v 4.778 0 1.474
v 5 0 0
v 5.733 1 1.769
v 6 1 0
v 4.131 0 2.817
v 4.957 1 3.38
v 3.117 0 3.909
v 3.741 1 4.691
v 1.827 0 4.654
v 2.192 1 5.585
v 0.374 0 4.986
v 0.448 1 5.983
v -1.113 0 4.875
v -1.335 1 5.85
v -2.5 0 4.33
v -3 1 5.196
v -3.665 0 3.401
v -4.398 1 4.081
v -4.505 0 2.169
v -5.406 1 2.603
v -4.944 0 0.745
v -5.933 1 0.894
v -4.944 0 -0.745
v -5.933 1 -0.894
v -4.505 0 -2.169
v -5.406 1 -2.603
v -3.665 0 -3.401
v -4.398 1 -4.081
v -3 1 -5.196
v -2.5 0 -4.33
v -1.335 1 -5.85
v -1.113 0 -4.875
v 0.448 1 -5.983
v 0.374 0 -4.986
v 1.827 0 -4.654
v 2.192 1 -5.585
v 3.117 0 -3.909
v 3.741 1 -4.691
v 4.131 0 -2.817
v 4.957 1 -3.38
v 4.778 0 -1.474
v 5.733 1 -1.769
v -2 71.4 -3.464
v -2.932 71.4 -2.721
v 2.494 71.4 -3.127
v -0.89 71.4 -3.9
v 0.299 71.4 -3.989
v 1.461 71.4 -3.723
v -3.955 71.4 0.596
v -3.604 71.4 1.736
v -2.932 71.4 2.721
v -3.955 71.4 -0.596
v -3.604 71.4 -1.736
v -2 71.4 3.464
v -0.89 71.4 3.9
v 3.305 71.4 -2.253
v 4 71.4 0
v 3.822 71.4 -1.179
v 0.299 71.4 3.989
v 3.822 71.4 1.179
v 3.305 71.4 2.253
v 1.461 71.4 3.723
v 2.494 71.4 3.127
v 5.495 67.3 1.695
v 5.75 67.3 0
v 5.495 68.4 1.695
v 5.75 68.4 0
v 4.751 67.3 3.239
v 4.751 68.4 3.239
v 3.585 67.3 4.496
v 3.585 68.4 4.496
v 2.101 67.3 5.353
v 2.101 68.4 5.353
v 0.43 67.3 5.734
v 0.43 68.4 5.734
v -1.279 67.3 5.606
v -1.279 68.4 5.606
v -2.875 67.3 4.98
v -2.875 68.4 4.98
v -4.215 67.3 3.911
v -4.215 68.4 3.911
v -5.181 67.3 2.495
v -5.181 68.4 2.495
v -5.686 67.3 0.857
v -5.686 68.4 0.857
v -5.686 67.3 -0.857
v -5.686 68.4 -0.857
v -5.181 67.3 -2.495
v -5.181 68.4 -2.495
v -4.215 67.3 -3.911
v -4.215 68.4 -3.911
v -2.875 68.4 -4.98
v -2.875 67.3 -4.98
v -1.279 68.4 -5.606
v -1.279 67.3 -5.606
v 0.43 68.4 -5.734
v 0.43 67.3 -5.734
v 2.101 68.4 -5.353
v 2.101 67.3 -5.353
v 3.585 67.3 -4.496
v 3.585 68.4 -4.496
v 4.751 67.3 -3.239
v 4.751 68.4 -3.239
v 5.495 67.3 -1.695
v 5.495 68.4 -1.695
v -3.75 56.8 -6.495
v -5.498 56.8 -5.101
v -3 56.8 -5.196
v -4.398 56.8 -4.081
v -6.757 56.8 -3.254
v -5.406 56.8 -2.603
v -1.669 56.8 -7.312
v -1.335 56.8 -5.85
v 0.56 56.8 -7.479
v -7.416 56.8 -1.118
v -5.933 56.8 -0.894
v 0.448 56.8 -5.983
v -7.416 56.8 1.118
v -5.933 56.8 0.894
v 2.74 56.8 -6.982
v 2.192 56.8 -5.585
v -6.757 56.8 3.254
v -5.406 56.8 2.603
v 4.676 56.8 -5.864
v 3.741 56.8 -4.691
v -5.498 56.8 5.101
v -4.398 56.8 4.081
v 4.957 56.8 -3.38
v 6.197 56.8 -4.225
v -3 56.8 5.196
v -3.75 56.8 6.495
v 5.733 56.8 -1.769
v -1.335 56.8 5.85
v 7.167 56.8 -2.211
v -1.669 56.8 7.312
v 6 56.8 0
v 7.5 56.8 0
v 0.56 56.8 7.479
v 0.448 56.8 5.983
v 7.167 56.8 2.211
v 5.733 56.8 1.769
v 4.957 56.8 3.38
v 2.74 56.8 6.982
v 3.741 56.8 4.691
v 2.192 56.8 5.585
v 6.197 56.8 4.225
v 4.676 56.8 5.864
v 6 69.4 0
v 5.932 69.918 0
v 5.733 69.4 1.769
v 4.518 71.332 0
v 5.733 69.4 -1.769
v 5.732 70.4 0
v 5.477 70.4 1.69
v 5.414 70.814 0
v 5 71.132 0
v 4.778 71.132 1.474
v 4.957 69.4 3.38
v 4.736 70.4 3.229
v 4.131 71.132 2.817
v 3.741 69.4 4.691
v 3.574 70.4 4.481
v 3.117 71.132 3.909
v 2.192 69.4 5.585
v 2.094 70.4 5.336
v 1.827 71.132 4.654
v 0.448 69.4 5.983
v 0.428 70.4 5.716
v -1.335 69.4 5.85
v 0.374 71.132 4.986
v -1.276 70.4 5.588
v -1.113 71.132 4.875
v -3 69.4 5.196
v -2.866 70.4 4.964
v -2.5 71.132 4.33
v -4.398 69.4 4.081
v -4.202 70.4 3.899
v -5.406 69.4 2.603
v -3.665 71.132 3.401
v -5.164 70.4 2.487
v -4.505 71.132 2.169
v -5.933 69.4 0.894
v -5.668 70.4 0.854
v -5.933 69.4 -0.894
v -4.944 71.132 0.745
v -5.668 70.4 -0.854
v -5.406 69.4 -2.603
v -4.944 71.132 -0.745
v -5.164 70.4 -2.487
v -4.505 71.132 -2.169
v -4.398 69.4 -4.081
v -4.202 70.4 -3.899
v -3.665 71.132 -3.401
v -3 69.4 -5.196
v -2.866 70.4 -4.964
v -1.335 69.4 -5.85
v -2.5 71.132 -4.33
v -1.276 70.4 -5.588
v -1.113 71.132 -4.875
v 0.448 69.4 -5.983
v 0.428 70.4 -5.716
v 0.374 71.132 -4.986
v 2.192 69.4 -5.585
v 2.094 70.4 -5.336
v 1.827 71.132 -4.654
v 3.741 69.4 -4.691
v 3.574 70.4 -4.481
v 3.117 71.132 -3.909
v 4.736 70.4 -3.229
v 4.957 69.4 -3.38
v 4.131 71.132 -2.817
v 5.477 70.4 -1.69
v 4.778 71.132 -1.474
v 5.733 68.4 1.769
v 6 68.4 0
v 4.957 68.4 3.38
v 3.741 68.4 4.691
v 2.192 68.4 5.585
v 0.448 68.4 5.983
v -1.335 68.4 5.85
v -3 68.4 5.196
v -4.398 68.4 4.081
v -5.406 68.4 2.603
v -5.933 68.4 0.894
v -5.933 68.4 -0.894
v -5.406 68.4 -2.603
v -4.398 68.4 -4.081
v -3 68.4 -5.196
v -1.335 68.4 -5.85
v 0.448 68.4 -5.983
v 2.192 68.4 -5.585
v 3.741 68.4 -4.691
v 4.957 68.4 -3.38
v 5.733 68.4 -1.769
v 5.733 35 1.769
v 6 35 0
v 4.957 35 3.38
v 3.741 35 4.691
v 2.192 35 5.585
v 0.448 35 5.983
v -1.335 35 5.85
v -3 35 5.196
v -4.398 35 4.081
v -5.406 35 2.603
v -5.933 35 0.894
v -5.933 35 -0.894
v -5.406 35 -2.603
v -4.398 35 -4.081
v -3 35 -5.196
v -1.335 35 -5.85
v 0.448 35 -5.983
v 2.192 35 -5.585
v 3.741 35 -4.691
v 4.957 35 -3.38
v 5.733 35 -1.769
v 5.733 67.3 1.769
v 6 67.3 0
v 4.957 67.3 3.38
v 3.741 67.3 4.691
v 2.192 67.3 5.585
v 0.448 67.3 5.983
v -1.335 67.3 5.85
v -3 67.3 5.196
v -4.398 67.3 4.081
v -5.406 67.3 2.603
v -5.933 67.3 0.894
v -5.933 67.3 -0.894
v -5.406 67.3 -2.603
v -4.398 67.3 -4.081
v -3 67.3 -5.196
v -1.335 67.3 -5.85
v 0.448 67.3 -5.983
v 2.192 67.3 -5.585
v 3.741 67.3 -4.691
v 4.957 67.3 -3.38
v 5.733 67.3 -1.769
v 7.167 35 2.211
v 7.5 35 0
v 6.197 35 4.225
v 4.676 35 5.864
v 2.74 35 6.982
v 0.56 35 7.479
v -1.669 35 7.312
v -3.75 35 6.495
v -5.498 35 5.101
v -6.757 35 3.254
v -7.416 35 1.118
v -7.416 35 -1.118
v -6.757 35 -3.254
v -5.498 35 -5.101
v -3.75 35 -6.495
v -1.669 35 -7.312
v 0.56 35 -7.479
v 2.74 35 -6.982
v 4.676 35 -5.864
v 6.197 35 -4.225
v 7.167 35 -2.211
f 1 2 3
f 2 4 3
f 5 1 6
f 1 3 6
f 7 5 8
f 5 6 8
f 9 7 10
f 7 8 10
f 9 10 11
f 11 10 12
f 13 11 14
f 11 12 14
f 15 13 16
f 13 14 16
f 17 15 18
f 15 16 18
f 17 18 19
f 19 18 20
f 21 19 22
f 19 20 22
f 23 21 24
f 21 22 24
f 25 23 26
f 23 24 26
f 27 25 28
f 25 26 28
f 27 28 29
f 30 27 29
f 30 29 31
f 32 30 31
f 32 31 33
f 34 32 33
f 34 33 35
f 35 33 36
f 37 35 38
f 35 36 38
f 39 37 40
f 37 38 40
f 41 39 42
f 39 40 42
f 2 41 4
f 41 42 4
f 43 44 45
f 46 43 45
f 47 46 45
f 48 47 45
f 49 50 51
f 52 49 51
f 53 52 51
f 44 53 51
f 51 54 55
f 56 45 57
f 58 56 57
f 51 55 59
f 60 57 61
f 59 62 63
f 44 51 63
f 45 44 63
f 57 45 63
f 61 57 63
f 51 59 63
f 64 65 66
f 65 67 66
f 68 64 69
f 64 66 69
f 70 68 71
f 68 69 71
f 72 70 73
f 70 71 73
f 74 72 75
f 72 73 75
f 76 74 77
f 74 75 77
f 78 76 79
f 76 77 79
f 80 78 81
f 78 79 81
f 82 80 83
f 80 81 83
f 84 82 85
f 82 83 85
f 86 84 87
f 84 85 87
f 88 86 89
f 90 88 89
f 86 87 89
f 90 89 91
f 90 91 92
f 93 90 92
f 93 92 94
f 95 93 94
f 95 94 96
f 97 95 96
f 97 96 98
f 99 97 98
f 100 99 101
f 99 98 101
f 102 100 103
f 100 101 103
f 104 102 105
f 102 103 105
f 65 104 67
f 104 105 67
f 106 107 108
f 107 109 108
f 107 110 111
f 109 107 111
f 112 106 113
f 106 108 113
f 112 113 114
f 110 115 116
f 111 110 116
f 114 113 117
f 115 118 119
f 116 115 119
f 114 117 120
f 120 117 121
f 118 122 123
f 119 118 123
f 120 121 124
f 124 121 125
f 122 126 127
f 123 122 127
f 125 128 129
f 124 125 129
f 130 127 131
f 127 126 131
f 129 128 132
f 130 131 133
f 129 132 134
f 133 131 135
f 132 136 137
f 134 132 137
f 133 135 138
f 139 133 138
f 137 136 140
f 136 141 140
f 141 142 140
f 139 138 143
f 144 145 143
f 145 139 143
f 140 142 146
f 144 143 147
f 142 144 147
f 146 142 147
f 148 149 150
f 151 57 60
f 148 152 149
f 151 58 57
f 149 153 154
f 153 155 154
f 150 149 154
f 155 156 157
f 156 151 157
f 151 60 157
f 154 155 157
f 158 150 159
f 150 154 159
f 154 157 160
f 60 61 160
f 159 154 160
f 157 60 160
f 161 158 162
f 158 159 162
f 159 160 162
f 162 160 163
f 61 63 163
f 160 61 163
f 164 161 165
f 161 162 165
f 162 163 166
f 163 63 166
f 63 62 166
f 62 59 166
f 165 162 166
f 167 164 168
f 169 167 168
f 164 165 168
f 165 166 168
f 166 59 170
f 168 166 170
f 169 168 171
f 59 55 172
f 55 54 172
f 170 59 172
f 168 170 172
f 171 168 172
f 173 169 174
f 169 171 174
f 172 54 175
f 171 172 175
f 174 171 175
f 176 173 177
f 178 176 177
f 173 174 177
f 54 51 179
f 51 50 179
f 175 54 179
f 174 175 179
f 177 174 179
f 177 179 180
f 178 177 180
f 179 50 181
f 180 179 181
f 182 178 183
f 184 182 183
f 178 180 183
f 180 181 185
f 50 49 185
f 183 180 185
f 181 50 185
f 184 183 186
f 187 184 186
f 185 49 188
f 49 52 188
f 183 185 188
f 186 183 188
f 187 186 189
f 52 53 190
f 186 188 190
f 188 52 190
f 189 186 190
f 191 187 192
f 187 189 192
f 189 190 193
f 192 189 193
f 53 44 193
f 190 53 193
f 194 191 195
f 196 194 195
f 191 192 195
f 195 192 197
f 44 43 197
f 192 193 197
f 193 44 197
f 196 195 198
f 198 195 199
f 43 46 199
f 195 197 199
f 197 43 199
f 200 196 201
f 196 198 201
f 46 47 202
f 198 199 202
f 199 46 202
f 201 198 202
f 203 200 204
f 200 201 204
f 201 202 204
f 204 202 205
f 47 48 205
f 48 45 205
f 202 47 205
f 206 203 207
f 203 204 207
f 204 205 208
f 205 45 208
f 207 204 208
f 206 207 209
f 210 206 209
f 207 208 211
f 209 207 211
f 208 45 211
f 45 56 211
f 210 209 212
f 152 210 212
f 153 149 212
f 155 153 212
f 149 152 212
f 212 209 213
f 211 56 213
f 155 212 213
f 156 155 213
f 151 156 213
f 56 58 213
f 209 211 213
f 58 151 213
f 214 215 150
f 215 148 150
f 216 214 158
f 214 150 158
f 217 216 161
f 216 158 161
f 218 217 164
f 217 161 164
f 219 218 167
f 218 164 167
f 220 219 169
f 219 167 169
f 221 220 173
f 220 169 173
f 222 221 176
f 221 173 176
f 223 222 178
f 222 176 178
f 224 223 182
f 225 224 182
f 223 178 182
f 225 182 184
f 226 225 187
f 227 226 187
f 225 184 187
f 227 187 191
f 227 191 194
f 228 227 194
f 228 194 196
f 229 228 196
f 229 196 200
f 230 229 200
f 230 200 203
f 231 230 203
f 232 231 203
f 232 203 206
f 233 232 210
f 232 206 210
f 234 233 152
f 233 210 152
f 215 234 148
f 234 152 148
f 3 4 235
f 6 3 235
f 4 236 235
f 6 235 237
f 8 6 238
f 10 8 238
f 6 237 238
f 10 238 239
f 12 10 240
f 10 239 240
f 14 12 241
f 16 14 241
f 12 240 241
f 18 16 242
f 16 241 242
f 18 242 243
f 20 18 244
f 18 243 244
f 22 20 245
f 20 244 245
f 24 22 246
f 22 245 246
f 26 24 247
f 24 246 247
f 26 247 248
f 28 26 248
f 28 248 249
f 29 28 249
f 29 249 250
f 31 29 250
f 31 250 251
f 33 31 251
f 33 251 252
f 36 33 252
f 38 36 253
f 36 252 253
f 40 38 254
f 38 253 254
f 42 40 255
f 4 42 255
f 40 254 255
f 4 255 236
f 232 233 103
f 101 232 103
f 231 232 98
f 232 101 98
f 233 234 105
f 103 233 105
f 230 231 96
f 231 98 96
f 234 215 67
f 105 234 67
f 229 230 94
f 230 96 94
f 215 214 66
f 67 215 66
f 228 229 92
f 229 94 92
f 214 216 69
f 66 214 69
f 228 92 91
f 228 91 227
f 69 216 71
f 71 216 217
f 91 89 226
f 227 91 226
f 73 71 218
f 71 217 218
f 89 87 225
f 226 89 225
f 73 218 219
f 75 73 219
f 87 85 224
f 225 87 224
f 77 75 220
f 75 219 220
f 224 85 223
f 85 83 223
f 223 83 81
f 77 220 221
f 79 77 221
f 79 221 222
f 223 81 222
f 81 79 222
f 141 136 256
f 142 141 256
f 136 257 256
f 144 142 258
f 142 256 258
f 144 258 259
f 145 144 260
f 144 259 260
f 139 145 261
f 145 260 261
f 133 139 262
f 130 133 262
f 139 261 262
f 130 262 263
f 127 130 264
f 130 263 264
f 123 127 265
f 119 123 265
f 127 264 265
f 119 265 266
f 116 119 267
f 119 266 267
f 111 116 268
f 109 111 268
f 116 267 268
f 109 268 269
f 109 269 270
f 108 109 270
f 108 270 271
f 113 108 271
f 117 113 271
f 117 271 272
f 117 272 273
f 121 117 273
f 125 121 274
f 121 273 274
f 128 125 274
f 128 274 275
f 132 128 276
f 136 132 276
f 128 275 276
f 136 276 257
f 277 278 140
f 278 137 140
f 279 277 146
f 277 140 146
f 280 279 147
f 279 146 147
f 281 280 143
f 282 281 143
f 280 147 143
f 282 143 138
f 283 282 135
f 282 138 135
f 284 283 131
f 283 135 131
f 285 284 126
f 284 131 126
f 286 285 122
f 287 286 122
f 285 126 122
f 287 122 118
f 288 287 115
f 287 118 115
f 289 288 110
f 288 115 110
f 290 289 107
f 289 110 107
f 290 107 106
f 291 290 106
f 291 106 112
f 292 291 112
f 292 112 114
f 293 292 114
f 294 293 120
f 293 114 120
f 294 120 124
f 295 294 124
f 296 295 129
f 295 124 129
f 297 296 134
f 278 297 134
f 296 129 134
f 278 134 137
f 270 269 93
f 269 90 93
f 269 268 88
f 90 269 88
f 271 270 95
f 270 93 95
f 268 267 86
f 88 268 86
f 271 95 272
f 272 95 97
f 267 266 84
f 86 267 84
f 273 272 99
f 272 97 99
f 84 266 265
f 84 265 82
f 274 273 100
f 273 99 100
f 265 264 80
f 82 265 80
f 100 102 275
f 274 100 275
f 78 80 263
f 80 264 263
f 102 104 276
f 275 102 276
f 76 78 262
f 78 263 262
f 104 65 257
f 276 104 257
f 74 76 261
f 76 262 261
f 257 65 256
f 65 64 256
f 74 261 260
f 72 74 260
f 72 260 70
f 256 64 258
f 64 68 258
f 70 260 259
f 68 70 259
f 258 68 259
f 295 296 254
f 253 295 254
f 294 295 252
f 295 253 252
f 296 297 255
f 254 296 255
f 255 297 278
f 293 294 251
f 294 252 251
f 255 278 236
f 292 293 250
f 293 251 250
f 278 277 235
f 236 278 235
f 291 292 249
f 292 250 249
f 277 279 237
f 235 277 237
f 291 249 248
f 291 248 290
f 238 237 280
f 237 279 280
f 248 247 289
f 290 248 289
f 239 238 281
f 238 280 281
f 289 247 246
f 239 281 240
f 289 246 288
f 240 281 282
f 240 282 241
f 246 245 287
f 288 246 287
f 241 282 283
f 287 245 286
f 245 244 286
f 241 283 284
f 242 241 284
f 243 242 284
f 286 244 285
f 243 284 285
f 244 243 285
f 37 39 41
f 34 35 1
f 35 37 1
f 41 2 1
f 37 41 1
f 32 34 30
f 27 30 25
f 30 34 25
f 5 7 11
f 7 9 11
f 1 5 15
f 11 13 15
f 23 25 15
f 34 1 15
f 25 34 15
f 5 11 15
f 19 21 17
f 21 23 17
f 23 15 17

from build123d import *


with BuildPart() as part:
    # Sketch1 → Revolve1 (revolve)
    with BuildSketch(Plane.XY):
        with BuildLine():
            Line((0, 71.4), (0, 0))
            Line((0, 0), (5, 0))
            Line((5, 0), (6, 1))
            Line((6, 1), (6, 35))
            Line((6, 35), (7.5, 35))
            Line((7.5, 35), (7.5, 56.8))
            Line((7.5, 56.8), (6, 56.8))
            Line((6, 56.8), (6, 67.3))
            Line((6, 67.3), (5.75, 67.3))
            Line((5.75, 67.3), (5.75, 68.4))
            Line((5.75, 68.4), (6, 68.4))
            Line((6, 68.4), (6, 69.4))
            ThreePointArc((6, 69.4), (5.414213562, 70.814213562), (4, 71.4))
            Line((4, 71.4), (0, 71.4))
        make_face()
    revolve(axis=Axis((0, 71.4, 0), (0, -1, 0)))


solid = part.part
